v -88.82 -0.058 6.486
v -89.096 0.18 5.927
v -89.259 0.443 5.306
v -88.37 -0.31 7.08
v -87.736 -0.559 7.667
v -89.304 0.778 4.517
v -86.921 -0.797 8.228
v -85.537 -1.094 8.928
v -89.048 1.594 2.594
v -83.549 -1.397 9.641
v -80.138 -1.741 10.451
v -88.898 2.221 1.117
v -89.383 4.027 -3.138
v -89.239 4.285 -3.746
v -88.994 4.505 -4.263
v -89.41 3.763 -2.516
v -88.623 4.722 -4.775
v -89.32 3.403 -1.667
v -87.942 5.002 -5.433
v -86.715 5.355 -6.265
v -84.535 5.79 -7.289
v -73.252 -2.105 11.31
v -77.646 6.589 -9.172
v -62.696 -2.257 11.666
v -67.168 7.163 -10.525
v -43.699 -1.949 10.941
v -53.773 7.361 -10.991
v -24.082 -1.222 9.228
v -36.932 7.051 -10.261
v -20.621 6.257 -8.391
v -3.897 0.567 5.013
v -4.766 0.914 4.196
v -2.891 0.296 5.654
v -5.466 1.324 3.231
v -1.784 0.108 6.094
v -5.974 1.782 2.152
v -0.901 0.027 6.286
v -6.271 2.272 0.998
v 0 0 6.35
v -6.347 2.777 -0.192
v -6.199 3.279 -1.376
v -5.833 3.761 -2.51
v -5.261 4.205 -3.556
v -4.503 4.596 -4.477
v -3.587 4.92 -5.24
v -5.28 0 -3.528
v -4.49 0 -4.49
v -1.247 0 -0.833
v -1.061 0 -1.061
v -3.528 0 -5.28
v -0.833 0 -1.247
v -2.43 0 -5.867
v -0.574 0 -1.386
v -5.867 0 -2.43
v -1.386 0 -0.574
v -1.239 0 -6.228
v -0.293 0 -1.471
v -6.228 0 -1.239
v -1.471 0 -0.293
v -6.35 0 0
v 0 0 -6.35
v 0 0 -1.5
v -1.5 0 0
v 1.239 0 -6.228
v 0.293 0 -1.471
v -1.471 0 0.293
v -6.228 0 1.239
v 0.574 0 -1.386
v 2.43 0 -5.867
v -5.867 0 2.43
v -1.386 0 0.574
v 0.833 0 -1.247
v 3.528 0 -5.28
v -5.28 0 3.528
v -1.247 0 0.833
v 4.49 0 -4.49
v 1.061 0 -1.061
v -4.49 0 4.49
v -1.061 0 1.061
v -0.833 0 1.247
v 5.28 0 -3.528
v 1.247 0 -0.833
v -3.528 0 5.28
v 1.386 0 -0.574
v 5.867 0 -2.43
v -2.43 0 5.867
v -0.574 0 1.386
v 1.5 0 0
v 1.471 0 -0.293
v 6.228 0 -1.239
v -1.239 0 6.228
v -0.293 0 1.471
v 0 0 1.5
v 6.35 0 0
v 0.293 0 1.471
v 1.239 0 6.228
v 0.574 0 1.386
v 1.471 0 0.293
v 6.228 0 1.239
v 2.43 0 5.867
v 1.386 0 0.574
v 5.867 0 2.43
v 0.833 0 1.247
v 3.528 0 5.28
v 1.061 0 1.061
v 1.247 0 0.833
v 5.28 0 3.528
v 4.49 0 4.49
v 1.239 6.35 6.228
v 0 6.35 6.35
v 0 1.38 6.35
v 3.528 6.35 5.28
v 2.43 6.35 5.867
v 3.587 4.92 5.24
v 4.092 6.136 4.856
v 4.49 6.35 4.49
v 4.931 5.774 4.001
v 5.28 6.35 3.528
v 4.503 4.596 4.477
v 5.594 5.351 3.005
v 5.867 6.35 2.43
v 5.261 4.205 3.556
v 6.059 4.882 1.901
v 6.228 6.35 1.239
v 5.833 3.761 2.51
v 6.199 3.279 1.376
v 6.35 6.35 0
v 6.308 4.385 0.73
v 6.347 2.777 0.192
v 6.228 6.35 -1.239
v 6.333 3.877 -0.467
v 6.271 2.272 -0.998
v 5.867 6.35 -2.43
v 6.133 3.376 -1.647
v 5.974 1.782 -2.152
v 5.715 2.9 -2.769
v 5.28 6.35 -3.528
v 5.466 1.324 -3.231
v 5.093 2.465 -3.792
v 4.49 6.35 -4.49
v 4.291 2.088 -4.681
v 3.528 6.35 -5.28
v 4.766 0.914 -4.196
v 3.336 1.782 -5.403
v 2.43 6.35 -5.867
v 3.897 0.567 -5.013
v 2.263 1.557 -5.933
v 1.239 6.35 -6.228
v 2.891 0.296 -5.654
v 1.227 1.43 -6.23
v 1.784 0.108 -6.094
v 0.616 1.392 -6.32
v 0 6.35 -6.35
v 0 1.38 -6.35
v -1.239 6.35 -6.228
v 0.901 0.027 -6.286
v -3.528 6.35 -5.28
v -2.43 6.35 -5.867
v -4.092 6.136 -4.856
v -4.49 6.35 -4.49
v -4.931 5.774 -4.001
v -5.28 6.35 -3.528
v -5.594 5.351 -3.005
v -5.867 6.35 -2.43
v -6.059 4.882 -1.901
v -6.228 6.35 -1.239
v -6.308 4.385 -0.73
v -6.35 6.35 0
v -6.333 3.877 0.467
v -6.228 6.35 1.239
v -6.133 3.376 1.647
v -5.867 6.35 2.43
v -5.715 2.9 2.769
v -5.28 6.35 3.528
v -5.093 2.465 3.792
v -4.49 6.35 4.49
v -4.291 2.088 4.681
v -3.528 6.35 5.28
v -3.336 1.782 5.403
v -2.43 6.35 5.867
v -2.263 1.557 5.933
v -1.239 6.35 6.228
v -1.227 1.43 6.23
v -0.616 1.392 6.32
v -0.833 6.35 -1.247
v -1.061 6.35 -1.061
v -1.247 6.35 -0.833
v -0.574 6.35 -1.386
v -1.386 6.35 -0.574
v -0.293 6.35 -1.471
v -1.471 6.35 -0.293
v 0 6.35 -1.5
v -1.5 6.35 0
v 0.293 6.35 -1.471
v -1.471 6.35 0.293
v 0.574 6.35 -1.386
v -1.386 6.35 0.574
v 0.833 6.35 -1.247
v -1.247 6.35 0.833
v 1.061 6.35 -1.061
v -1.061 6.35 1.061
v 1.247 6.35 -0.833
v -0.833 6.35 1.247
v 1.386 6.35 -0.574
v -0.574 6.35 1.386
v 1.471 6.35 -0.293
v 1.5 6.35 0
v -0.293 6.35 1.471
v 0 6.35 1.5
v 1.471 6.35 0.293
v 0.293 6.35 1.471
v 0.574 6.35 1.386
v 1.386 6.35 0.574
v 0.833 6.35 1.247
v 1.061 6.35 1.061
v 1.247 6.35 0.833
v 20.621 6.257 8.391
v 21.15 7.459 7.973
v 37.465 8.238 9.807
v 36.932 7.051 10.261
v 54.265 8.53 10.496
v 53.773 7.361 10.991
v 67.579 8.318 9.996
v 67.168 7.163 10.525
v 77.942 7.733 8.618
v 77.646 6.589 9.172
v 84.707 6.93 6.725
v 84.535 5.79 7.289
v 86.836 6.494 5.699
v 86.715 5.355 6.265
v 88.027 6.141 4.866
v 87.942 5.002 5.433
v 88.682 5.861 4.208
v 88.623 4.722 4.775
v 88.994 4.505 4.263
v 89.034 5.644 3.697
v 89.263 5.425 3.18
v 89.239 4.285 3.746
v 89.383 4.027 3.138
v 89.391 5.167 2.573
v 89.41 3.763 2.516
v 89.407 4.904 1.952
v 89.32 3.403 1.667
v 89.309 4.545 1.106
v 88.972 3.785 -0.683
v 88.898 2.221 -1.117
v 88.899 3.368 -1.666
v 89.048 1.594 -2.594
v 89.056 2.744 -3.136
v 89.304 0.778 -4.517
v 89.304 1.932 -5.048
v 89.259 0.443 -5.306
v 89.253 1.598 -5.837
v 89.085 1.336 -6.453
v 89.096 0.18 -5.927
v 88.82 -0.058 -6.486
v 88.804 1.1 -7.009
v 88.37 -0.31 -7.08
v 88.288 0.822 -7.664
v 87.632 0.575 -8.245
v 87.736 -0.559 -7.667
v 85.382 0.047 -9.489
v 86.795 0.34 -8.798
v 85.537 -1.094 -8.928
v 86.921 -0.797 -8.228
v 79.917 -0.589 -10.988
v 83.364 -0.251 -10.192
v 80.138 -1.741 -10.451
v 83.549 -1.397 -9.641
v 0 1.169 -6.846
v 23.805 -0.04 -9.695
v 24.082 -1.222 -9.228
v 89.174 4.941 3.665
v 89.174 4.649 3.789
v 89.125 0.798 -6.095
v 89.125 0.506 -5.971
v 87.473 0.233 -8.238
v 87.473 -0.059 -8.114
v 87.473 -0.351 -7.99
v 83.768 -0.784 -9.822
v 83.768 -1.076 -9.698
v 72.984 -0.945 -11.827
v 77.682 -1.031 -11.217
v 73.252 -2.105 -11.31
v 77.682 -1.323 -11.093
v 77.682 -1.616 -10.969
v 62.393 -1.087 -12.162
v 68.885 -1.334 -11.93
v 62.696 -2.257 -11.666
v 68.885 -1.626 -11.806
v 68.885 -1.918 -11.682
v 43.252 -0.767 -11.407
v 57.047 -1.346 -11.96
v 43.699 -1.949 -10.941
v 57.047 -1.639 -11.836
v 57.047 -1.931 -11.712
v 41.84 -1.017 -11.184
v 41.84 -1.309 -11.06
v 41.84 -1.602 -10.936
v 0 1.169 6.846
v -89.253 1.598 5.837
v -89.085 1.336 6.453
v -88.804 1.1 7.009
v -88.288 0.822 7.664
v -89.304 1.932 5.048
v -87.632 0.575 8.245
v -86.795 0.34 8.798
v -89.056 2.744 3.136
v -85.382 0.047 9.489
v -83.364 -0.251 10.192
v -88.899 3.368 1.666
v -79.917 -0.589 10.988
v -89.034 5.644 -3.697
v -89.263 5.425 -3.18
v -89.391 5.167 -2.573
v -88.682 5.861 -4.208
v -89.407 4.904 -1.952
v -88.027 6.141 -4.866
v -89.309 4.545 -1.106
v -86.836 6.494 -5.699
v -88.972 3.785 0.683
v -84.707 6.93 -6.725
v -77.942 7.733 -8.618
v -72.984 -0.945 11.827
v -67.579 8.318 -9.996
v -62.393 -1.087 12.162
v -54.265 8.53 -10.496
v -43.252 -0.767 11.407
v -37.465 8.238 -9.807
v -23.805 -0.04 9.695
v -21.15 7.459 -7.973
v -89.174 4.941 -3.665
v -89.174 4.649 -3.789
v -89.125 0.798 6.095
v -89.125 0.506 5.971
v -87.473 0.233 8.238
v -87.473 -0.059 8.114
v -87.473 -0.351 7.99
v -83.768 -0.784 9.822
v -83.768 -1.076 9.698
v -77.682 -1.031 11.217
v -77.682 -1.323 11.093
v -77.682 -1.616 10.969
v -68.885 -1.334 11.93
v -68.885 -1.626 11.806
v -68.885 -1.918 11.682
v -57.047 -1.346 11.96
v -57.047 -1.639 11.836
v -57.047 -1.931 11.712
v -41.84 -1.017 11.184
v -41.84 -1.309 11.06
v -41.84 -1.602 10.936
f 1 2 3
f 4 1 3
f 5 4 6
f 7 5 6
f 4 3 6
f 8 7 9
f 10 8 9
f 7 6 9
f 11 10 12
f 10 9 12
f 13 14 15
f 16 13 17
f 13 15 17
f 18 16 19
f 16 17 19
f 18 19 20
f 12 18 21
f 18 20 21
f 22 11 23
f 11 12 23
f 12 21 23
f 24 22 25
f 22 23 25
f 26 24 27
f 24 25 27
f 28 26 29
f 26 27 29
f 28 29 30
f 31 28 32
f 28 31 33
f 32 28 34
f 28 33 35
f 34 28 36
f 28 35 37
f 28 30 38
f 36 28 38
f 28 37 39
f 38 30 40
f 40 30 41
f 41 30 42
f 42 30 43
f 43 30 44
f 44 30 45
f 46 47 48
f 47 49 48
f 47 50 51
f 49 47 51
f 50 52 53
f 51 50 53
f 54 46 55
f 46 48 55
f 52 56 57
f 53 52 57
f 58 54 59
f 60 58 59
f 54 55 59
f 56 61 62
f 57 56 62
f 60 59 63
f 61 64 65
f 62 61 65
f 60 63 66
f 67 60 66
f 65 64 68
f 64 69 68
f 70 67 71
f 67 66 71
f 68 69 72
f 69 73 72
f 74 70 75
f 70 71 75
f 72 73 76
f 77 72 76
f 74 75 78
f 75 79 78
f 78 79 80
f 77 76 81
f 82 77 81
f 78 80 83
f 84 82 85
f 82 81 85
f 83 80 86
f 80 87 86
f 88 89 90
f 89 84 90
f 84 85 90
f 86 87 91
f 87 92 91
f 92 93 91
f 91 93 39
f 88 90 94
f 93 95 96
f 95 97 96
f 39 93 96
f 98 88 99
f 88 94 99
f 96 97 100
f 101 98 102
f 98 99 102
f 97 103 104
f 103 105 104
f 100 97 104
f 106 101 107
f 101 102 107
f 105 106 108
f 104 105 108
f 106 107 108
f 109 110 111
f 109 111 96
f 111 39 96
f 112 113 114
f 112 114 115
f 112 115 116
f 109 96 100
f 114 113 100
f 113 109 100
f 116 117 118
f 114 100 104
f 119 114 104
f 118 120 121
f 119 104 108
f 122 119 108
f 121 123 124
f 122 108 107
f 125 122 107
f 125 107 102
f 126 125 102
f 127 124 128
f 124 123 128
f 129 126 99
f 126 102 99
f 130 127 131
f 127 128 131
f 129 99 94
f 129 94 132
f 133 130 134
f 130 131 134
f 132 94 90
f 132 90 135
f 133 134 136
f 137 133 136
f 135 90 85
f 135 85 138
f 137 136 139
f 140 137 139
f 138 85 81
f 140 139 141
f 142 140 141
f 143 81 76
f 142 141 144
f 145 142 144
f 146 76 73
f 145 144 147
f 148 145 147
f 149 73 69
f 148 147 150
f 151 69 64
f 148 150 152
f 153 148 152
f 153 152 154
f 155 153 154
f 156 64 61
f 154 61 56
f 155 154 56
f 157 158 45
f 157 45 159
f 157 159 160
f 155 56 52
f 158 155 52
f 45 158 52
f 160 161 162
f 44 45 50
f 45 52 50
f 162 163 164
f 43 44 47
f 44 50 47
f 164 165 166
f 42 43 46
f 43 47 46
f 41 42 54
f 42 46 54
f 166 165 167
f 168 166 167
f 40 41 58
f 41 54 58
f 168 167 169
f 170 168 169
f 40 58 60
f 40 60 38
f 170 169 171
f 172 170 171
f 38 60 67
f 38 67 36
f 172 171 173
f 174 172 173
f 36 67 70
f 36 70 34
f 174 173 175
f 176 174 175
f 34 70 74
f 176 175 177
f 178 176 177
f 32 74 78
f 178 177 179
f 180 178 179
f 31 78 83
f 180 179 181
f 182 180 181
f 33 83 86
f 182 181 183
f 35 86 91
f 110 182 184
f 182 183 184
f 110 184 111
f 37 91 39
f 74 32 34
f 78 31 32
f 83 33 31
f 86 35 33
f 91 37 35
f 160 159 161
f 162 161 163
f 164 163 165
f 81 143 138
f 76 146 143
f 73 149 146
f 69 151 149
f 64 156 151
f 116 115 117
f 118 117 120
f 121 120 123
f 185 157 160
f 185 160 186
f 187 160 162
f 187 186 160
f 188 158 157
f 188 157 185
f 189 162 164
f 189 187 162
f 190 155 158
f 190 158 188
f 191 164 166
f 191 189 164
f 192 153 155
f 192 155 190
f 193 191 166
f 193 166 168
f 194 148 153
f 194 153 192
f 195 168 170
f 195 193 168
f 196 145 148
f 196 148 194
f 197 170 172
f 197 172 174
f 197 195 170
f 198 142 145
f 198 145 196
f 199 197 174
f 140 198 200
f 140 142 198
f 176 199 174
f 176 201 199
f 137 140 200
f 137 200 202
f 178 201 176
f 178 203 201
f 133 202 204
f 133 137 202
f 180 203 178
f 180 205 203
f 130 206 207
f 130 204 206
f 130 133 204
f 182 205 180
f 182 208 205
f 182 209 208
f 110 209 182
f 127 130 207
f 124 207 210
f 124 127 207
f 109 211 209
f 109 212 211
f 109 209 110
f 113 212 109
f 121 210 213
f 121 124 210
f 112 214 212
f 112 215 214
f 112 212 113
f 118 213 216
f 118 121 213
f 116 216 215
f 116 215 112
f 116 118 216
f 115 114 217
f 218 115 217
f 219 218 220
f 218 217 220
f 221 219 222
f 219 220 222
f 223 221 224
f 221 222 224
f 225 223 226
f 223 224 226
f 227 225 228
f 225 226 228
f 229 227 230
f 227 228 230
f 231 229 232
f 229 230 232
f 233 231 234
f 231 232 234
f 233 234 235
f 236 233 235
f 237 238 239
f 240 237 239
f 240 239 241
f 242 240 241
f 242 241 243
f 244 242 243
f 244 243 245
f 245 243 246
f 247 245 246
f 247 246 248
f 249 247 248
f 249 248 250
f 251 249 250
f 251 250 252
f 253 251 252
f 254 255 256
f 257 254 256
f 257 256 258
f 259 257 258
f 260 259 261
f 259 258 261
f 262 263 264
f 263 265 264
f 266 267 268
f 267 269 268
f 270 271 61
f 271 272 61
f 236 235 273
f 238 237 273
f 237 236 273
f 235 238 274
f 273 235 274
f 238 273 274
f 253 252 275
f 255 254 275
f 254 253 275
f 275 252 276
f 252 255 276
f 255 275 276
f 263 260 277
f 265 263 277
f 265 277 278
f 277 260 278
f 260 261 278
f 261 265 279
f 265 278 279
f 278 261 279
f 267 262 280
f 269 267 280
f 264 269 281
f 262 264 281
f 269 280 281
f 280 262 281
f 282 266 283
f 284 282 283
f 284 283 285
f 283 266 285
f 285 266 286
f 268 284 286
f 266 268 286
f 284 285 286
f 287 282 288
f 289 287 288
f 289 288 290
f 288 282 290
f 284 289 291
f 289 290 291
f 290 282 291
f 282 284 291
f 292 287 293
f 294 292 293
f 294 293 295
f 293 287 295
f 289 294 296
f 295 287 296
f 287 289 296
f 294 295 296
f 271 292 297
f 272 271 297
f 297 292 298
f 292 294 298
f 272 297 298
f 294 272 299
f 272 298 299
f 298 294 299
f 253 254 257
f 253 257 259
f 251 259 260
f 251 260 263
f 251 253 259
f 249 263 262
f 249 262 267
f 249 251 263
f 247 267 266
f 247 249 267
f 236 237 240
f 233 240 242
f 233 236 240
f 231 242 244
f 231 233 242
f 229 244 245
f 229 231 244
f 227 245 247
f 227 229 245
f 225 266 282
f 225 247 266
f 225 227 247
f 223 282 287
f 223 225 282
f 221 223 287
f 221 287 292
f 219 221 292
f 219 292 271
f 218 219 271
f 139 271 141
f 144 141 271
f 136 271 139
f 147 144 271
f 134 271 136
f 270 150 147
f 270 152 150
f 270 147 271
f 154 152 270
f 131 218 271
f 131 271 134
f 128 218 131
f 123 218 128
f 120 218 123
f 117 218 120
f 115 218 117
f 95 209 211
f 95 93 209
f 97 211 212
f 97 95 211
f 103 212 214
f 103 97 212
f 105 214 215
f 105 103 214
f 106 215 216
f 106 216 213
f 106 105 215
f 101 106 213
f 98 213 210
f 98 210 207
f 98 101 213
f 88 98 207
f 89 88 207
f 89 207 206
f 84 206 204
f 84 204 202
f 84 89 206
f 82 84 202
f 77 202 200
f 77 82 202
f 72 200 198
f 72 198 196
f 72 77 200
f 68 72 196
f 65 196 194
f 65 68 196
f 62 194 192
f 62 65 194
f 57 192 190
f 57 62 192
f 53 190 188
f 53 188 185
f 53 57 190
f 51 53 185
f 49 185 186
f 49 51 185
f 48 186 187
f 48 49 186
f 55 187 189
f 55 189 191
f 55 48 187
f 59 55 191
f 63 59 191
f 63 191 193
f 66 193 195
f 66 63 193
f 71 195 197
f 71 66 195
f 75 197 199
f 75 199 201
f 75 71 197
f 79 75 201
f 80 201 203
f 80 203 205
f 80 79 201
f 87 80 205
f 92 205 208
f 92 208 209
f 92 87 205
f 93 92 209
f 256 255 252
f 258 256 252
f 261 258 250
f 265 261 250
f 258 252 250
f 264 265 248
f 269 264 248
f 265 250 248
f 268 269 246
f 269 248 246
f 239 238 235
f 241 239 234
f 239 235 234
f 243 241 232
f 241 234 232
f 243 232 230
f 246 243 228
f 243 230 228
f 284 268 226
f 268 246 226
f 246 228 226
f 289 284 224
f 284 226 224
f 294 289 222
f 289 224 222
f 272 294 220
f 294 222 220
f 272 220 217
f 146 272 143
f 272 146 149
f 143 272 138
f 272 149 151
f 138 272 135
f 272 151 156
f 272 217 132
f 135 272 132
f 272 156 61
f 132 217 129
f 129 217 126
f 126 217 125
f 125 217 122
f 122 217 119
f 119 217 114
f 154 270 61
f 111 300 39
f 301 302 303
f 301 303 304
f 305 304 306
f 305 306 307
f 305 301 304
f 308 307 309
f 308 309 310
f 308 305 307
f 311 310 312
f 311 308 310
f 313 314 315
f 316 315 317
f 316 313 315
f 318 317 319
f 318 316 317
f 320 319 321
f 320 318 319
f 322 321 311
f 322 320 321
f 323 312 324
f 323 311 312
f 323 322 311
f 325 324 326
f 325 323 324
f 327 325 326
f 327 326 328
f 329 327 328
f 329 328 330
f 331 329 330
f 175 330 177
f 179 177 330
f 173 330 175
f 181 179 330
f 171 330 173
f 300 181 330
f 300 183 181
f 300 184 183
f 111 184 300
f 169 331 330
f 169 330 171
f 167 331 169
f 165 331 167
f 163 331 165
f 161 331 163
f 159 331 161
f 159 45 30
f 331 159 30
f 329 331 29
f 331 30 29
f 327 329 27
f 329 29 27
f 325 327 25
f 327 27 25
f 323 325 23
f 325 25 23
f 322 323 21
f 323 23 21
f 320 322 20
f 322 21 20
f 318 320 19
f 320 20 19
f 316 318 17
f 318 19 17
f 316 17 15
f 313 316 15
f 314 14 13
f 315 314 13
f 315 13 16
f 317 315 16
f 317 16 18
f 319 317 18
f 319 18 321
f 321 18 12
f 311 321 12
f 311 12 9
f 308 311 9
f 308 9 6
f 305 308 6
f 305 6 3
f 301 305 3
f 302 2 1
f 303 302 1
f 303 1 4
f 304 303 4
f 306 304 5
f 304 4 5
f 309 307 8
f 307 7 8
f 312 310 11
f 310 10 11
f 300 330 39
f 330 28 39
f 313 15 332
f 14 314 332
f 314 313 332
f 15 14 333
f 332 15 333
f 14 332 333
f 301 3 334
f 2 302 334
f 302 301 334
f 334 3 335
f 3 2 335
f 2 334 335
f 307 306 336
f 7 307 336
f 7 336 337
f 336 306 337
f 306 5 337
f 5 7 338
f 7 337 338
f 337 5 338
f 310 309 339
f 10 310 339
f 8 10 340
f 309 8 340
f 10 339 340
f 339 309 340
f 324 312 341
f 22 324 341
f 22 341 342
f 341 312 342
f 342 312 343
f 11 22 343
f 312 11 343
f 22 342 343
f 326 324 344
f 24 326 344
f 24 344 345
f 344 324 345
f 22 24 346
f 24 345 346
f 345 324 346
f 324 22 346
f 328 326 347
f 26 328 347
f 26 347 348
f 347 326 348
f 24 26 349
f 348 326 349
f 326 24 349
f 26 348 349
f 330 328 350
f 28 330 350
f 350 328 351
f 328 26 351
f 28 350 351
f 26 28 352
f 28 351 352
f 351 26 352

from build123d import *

# Parameters (mm, degrees)
SKETCH1_R           = 6.35
SKETCH1_R_2         = 1.5
BOSS_EXTRUDE1_DEPTH = 6.35
BOSS_EXTRUDE2_DEPTH = 1.27
CIRPATTERN1_COUNT   = 2
SKETCH6_R           = 1.5
CUT_EXTRUDE7_DEPTH  = 91.638322024


with BuildPart() as part:
    # Sketch1 → Boss-Extrude1 (new body)
    with BuildSketch(Plane(origin=(0, 0, 0), x_dir=(1, 0, 0), z_dir=(0, 1, 0))):
        with Locations(Location((0, 0, 0), (0, 0, 270))):
            Circle(SKETCH1_R)
        with Locations(Location((0, 0, 0), (0, 0, 270))):
            Circle(SKETCH1_R_2, mode=Mode.SUBTRACT)
    extrude(amount=BOSS_EXTRUDE1_DEPTH)

    # Sketch5 → Boss-Extrude2 (add)
    with BuildSketch(Plane(origin=(0, 2.283903866, -0.969459674), x_dir=(-1, 0, 0), z_dir=(0, 0.9205048534524427, -0.39073112848926805))):
        with BuildLine():
            Line((0, -5.845205819), (0, 5.845205819))
            add(Edge.make_bspline(
                [(0, 5.845205819), (-43.236705744, 17.099647121), (-94.2907228, 12.951703411), (-88.061726505, -0.009433869), (-92.616159199, -10.411025475), (-66.821854292, -15.476429188), (0, -5.845205819)],
                knots=[0, 0, 0, 0, 0.469261671, 0.561898963, 0.654536254, 1, 1, 1, 1], degree=3))
        make_face()
    boss_extrude2 = extrude(amount=BOSS_EXTRUDE2_DEPTH)

    # CirPattern1: Boss-Extrude2 ×2 about axis
    cirpattern1_axis = Axis((0, 6.35, 0), (0, 1, 0))
    for i in range(1, CIRPATTERN1_COUNT):
        add(boss_extrude2.rotate(cirpattern1_axis, i * 360 / CIRPATTERN1_COUNT))

    # Sketch6 → Cut-Extrude7 (cut, through all)
    with BuildSketch(Plane.XZ):
        with Locations(Location((0, 0, 0), (0, 0, 90))):
            Circle(SKETCH6_R)
    extrude(amount=-CUT_EXTRUDE7_DEPTH, mode=Mode.SUBTRACT)


solid = part.part
